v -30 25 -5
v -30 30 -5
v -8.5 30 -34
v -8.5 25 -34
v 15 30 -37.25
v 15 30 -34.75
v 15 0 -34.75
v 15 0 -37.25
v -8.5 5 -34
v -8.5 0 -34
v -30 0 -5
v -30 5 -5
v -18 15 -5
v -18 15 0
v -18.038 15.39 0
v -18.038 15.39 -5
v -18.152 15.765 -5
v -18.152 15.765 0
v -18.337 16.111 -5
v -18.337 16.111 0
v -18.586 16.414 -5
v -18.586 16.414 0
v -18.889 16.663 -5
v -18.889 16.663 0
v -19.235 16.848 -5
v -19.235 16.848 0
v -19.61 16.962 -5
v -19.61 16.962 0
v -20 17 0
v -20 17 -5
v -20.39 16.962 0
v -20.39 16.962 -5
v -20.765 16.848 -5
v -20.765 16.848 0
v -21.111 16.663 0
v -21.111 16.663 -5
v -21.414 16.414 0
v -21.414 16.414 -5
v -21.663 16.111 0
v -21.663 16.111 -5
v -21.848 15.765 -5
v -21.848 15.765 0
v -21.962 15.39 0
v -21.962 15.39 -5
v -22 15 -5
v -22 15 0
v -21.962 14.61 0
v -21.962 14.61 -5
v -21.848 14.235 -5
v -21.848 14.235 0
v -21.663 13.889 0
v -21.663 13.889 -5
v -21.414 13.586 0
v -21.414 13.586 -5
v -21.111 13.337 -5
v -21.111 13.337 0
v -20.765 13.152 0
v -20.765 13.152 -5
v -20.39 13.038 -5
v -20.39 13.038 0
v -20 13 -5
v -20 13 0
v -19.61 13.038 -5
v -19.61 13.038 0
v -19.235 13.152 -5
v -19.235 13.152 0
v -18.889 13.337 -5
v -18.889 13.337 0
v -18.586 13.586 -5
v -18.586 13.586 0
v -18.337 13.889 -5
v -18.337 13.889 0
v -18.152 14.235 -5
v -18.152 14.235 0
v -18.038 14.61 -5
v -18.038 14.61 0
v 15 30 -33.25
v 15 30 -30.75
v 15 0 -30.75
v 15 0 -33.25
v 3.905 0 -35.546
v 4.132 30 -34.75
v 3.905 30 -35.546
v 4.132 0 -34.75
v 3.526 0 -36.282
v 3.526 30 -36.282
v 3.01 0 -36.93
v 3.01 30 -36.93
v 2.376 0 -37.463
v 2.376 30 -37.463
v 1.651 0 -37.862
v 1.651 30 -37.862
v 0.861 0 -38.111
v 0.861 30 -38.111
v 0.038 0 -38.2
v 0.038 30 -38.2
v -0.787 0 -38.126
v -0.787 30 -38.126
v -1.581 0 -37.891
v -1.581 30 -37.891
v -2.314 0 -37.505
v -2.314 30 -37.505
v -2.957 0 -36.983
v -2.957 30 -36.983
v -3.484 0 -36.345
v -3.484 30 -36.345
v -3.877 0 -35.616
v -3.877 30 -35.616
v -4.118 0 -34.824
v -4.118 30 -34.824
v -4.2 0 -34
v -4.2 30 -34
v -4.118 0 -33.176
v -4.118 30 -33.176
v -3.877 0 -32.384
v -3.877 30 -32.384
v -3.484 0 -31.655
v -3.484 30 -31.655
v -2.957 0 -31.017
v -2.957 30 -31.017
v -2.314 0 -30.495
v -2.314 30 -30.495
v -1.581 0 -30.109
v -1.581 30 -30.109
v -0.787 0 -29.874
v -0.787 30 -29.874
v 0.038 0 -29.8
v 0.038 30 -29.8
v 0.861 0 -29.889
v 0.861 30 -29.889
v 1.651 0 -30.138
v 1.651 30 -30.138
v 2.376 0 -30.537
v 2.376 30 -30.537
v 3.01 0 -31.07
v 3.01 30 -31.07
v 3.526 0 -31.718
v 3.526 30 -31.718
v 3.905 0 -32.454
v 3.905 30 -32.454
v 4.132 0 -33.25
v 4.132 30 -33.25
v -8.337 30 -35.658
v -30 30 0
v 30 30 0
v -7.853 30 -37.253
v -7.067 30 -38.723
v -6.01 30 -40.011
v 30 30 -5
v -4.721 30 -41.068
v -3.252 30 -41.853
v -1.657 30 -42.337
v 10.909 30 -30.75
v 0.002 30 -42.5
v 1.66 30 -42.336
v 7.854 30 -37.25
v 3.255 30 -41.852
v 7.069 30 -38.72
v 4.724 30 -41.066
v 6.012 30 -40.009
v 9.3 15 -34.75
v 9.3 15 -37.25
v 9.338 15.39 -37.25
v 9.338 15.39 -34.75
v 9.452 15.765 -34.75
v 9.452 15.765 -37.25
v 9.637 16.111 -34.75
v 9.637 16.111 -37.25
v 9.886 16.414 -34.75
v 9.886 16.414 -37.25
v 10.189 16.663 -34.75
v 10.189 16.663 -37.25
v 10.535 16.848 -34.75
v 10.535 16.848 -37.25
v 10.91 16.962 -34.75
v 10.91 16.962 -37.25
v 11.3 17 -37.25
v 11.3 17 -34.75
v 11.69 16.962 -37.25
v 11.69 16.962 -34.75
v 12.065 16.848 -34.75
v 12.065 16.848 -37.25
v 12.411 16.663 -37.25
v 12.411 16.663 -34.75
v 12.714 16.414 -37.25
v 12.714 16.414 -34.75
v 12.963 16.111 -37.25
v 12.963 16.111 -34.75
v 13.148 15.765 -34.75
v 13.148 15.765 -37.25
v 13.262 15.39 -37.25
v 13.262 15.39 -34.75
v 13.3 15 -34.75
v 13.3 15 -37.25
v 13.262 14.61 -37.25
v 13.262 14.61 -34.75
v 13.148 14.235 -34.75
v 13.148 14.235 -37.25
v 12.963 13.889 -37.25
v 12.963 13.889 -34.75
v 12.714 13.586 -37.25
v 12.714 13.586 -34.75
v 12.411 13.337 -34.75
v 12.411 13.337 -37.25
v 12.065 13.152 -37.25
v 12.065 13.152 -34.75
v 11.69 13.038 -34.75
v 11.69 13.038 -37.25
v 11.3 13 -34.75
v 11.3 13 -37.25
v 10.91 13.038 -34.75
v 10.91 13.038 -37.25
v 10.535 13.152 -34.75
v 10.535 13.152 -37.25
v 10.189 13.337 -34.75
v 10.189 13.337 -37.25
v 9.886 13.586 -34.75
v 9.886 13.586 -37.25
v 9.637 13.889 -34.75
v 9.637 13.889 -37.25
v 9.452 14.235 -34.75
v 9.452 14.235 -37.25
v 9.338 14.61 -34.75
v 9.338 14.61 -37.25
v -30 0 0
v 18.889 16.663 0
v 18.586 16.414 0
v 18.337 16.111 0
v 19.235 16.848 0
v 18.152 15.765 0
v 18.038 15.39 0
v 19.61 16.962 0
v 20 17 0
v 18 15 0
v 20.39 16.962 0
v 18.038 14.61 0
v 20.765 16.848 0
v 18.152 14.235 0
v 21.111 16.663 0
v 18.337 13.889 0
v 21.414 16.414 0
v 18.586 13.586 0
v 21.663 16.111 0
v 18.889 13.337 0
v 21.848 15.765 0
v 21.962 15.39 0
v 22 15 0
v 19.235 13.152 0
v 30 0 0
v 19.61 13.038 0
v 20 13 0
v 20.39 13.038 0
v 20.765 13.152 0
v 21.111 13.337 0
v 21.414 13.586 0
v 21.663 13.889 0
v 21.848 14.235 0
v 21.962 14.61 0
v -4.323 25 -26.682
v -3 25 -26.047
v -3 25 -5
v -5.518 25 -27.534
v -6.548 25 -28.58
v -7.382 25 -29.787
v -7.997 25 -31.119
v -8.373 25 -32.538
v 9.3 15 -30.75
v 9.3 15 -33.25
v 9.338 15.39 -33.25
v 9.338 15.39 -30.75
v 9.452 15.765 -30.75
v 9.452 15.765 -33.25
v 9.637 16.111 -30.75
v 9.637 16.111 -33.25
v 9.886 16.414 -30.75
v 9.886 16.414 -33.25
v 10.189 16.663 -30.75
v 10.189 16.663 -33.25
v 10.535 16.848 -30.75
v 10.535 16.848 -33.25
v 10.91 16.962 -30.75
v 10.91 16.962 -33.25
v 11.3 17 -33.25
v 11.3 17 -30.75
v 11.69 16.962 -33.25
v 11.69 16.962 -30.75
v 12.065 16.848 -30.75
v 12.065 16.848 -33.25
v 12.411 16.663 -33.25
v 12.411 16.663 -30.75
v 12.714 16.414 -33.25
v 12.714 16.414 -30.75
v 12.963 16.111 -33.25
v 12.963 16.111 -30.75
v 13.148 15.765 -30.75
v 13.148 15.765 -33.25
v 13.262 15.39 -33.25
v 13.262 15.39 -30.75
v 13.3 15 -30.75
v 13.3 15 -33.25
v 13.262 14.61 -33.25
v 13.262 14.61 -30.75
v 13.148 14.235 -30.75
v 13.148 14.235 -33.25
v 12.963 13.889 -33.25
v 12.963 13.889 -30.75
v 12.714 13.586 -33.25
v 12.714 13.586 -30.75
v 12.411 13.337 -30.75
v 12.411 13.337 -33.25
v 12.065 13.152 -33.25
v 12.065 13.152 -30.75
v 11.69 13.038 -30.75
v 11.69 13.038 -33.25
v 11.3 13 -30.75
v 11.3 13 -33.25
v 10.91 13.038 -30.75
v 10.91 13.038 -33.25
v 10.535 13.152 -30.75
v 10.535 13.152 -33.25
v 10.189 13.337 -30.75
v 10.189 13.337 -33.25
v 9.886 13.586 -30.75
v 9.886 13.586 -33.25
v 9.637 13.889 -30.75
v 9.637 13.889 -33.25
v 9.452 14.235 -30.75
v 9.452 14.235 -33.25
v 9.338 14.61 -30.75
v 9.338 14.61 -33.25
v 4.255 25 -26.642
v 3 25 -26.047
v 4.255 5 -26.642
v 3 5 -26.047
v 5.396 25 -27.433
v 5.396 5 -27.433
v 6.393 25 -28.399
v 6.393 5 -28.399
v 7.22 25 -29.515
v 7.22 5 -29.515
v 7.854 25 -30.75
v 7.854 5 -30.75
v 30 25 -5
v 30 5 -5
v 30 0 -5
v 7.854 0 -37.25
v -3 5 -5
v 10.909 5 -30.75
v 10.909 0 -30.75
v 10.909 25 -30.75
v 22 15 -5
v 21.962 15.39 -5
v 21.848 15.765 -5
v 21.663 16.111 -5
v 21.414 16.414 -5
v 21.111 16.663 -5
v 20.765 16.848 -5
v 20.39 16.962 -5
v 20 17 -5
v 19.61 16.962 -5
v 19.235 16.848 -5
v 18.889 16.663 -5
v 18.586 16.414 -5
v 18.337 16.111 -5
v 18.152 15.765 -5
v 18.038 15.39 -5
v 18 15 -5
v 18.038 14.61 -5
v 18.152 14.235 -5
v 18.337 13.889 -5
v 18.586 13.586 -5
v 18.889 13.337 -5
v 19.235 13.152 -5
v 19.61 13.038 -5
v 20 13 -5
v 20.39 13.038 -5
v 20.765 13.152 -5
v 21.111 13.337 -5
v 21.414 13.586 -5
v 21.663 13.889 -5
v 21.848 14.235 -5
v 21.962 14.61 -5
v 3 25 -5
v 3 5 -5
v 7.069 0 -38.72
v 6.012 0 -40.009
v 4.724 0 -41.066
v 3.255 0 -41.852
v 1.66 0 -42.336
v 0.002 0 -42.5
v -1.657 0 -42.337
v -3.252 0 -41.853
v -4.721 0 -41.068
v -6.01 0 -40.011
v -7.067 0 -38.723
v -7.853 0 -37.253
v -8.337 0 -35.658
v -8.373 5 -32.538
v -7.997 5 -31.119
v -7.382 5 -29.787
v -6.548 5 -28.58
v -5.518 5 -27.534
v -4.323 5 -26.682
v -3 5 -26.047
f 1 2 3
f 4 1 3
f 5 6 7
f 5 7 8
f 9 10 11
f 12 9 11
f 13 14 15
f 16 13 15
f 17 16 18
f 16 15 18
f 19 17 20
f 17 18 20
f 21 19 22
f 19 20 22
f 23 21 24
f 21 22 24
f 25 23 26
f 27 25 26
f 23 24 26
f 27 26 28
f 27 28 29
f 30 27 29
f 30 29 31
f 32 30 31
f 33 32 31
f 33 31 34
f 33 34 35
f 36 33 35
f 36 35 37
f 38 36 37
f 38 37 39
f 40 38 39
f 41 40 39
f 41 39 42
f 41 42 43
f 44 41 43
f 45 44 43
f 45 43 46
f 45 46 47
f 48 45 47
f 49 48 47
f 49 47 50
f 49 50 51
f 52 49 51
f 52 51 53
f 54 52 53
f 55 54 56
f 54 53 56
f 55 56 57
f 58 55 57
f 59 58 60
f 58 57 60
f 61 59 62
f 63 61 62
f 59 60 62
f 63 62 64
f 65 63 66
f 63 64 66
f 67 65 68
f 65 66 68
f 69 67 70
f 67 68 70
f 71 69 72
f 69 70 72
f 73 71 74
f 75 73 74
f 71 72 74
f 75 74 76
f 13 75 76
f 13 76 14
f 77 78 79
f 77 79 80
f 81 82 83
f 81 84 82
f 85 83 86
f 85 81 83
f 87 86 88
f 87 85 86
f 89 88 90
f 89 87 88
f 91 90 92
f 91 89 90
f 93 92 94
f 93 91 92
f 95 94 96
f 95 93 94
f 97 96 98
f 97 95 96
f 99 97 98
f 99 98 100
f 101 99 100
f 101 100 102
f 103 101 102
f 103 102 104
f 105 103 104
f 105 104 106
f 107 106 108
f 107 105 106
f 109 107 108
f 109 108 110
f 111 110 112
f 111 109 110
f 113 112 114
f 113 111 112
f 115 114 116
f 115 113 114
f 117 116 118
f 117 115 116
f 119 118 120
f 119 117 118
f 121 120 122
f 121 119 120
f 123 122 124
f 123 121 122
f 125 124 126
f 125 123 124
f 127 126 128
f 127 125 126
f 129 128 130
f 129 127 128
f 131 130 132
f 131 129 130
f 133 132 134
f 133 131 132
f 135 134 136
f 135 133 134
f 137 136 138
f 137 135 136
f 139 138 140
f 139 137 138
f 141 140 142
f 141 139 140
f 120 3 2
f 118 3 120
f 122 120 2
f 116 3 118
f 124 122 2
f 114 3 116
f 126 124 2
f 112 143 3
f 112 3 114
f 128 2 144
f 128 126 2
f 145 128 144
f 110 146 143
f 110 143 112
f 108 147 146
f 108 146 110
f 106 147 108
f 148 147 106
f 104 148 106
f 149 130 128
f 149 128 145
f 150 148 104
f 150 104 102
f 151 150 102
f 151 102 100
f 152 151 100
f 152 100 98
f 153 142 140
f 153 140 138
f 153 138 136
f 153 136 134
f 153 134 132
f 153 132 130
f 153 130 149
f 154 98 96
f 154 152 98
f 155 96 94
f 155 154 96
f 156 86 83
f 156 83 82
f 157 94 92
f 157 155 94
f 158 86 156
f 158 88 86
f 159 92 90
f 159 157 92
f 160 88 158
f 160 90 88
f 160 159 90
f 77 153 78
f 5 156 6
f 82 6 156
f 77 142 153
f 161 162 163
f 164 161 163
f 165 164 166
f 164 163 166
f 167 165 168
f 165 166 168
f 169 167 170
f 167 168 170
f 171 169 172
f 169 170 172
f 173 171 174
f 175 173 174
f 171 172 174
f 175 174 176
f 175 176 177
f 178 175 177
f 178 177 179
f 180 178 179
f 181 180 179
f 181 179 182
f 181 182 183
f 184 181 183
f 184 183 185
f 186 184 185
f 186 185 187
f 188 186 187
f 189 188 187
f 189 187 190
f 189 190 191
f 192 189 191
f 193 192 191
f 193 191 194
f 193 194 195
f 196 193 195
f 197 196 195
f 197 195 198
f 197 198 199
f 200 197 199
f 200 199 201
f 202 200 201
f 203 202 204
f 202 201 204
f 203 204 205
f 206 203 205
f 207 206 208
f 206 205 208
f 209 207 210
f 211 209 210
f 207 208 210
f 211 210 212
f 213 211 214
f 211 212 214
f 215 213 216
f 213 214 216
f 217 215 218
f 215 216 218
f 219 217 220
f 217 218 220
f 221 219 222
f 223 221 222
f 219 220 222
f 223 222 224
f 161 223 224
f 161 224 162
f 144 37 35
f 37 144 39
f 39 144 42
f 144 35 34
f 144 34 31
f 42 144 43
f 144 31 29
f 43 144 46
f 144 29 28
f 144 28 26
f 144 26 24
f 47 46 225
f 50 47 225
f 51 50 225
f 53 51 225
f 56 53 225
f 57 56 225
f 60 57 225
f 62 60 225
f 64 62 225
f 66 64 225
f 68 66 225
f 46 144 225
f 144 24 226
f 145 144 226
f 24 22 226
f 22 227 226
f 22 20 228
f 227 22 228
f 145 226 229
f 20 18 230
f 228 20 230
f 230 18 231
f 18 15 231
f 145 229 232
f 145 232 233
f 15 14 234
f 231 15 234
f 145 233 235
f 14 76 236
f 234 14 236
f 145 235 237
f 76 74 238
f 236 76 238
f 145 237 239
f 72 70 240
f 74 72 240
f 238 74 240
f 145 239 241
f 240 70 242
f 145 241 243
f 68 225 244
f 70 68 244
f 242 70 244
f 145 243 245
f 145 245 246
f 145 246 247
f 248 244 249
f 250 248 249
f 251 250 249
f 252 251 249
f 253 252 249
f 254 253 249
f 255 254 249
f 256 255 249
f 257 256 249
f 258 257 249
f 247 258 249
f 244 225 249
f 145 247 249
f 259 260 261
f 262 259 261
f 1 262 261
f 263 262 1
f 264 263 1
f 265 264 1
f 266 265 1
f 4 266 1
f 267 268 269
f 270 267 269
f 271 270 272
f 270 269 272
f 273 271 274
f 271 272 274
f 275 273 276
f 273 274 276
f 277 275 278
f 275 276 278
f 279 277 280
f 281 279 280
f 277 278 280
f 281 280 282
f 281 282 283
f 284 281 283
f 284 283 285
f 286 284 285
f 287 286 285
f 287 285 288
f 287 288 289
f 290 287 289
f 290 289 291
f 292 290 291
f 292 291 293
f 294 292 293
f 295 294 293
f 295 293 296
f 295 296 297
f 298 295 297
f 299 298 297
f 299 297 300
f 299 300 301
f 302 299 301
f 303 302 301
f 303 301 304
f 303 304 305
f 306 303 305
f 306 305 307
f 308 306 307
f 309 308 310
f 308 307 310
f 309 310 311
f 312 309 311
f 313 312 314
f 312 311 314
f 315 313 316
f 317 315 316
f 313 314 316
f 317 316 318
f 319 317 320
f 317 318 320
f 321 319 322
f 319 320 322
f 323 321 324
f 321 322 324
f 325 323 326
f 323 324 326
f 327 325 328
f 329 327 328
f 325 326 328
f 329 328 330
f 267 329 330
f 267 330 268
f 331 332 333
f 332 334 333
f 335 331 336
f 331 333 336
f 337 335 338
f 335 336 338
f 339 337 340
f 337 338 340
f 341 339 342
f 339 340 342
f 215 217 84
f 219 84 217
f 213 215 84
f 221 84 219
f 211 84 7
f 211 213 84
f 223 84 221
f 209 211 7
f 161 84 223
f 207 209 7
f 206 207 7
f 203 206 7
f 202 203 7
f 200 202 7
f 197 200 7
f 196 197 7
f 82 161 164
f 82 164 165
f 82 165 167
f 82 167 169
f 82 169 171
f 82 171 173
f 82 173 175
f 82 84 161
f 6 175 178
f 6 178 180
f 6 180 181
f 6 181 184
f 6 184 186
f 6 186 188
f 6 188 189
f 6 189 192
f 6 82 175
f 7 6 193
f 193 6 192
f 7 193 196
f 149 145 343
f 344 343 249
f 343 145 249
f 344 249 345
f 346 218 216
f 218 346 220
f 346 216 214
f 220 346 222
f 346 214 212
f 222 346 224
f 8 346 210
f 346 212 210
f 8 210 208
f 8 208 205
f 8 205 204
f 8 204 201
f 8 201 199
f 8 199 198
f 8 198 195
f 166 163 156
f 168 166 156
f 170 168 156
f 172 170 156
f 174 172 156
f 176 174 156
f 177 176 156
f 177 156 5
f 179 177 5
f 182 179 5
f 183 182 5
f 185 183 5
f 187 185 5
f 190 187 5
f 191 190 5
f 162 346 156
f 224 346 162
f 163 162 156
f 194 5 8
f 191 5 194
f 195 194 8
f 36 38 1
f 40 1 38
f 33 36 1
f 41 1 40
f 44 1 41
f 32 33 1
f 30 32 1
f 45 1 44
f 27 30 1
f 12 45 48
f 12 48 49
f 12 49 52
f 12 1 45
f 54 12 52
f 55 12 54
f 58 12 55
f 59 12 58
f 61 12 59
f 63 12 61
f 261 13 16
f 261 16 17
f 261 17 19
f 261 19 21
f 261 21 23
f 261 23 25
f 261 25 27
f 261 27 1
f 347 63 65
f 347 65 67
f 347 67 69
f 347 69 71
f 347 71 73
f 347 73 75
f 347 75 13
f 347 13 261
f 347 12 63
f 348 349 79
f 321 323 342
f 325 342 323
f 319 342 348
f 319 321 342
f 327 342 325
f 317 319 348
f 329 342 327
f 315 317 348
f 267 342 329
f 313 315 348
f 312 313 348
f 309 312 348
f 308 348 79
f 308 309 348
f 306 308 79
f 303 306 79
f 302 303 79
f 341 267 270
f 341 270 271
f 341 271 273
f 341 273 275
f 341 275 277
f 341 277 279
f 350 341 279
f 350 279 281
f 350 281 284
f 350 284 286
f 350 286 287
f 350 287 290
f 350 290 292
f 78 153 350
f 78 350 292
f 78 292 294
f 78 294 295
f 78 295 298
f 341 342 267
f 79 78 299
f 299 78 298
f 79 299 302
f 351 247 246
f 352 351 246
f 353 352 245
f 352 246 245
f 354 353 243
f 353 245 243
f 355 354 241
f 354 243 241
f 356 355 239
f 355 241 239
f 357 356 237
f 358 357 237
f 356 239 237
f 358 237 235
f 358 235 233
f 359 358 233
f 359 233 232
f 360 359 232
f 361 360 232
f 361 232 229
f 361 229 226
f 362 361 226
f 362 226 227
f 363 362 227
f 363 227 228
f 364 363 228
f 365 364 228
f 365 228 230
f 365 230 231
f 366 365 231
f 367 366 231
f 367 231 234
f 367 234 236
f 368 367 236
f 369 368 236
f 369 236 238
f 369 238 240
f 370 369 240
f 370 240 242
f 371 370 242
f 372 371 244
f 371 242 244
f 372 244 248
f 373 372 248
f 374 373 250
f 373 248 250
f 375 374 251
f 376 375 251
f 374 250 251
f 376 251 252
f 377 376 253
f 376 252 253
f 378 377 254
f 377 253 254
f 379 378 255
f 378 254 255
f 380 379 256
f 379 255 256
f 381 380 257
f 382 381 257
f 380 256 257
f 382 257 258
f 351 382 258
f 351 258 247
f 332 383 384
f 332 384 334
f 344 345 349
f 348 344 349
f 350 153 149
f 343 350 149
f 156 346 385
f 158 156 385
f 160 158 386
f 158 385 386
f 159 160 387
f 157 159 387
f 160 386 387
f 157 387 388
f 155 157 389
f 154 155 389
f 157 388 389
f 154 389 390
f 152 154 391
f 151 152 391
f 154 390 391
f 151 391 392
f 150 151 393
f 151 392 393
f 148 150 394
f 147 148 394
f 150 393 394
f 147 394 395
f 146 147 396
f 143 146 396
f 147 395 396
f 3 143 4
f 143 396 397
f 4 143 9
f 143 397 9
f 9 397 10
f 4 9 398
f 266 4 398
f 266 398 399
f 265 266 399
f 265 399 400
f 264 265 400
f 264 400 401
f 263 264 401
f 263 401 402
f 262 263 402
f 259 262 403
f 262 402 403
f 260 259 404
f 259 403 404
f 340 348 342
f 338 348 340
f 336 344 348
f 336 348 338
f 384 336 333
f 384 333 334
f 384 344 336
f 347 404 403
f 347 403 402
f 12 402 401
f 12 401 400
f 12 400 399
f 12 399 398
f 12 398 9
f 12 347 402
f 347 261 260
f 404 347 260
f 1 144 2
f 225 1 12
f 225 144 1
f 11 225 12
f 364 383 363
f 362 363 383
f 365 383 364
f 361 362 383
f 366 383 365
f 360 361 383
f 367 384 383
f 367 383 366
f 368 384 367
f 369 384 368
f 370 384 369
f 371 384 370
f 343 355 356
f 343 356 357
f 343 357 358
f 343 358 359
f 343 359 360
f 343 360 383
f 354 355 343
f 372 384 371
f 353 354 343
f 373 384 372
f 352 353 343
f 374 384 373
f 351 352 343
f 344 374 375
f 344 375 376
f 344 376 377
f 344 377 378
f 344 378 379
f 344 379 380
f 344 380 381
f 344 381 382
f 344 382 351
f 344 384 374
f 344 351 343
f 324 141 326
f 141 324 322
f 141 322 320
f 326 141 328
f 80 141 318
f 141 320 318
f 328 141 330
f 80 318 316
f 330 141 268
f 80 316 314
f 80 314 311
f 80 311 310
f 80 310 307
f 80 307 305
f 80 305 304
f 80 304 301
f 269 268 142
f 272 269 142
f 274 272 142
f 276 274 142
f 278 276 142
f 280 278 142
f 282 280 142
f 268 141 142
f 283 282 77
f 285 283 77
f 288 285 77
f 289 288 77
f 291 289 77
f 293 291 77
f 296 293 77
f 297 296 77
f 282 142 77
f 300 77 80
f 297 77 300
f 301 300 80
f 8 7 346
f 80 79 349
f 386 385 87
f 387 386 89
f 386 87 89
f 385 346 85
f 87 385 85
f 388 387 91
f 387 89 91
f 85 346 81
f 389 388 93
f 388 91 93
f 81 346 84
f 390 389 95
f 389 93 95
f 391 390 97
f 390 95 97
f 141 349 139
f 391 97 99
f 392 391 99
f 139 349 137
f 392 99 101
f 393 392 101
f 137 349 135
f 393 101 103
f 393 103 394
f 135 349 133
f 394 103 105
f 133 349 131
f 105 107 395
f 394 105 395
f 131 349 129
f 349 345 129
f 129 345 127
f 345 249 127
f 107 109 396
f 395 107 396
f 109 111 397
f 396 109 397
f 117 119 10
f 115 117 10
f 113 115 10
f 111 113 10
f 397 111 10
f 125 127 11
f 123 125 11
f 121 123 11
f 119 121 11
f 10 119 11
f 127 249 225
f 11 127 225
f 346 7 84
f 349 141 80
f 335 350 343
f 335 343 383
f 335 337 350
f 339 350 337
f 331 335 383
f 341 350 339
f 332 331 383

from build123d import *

# Parameters (mm, degrees)
SZKIC1_R                      = 8.5
SZKIC1_R_2                    = 4.2
DODANIE_WYCI_GNI_CIE1_DEPTH   = 30
SZKIC1_W                      = 60
SZKIC1_H                      = 5
DODANIE_WYCI_GNI_CIE1_2_DEPTH = 30
DODANIE_WYCI_GNI_CIE2_DEPTH   = 5
SZKIC3_W                      = 6
SZKIC3_H                      = 22
DODANIE_WYCI_GNI_CIE3_DEPTH   = 26
DODANIE_WYCI_GNI_CIE4_DEPTH   = 5
WYTNIJ_WYCI_GNI_CIE1_REACH    = 62.052
SZKIC5_R                      = 2
WYTNIJ_WYCI_GNI_CIE2_REACH    = 62.052
SZKIC6_W                      = 10.270986067
SZKIC6_H                      = 1.5
SZKIC7_W                      = 9.24961725
SZKIC7_H                      = 2.5
DODANIE_WYCI_GNI_CIE5_DEPTH   = 30
SZKIC8_R                      = 2
WYTNIJ_WYCI_GNI_CIE3_DEPTH    = 30


with BuildPart() as part:
    # Szkic1 → Dodanie-wyciągnięcie1 (new body)
    with BuildSketch(Plane(origin=(0, 0, 0), x_dir=(1, 0, 0), z_dir=(0, 1, 0))):
        with Locations(Location((0, 34, 0), (0, 0, 270))):
            Circle(SZKIC1_R)
        with Locations(Location((0, 34, 0), (0, 0, 270))):
            Circle(SZKIC1_R_2, mode=Mode.SUBTRACT)
    extrude(amount=DODANIE_WYCI_GNI_CIE1_DEPTH)



with BuildPart() as body_2:
    # Szkic1 → Dodanie-wyci_gni_cie1 2 (new body)
    with BuildSketch(Plane(origin=(0, 0, 0), x_dir=(1, 0, 0), z_dir=(0, 1, 0))):
        with Locations((0, 2.5)):
            Rectangle(SZKIC1_W, SZKIC1_H)
    extrude(amount=DODANIE_WYCI_GNI_CIE1_2_DEPTH)


with BuildPart() as part_1:
    add(part.part)

    add(body_2.part)  # Dodanie-wyciągnięcie2 merges body 2
    # Szkic2 → Dodanie-wyciągnięcie2 (add)
    with BuildSketch(Plane.XZ):
        Polygon((30, -5), (8.5, -34), (0, -25.5), (-8.5, -34), (-30, -5), align=None)
    extrude(amount=-DODANIE_WYCI_GNI_CIE2_DEPTH)

    # Szkic3 → Dodanie-wyciągnięcie3 (add)
    with BuildSketch(Plane(origin=(0, 30, 0), x_dir=(1, 0, 0), z_dir=(0, 1, 0))):
        with Locations((0, 16)):
            Rectangle(SZKIC3_W, SZKIC3_H)
    extrude(amount=-DODANIE_WYCI_GNI_CIE3_DEPTH)

    # Szkic4 → Dodanie-wyciągnięcie4 (add)
    with BuildSketch(Plane(origin=(0, 30, 0), x_dir=(1, 0, 0), z_dir=(0, 1, 0))):
        Polygon((0, 26.824162036), (8.5, 34), (30, 5), (-30, 5), (-8.5, 34), align=None)
    extrude(amount=-DODANIE_WYCI_GNI_CIE4_DEPTH)

    # Szkic5 → Wytnij-wyciągnięcie1 (cut, up to next)
    with BuildSketch(Plane.XY, mode=Mode.PRIVATE) as wytnij_wyci_gni_cie1_sk1:
        with Locations((-20, 15)):
            Circle(SZKIC5_R)
    wytnij_wyci_gni_cie1_tool1 = extrude(wytnij_wyci_gni_cie1_sk1.sketch, amount=-WYTNIJ_WYCI_GNI_CIE1_REACH, mode=Mode.PRIVATE) & part_1.part
    # Szkic5 → Wytnij-wyciągnięcie1 (cut, up to next)
    with BuildSketch(Plane.XY, mode=Mode.PRIVATE) as wytnij_wyci_gni_cie1_sk2:
        with Locations((20, 15)):
            Circle(SZKIC5_R)
    wytnij_wyci_gni_cie1_tool2 = extrude(wytnij_wyci_gni_cie1_sk2.sketch, amount=-WYTNIJ_WYCI_GNI_CIE1_REACH, mode=Mode.PRIVATE) & part_1.part
    add(wytnij_wyci_gni_cie1_tool1.solids().sort_by_distance((-20, 15, 0))[0], mode=Mode.SUBTRACT)
    add(wytnij_wyci_gni_cie1_tool2.solids().sort_by_distance((20, 15, 0))[0], mode=Mode.SUBTRACT)

    # Szkic6 → Wytnij-wyciągnięcie2 (cut, up to next)
    with BuildSketch(Plane(origin=(0, 30, 0), x_dir=(1, 0, 0), z_dir=(0, 1, 0)), mode=Mode.PRIVATE) as wytnij_wyci_gni_cie2_sk1:
        with Locations((5.135493034, 34)):
            Rectangle(SZKIC6_W, SZKIC6_H)
    wytnij_wyci_gni_cie2_tool1 = extrude(wytnij_wyci_gni_cie2_sk1.sketch, amount=-WYTNIJ_WYCI_GNI_CIE2_REACH, mode=Mode.PRIVATE) & part_1.part
    add(wytnij_wyci_gni_cie2_tool1.solids().sort_by_distance((5.135493, 30, -34))[0], mode=Mode.SUBTRACT)

    # Szkic7 → Dodanie-wyciągnięcie5 (add)
    with BuildSketch(Plane(origin=(0, 30, 0), x_dir=(1, 0, 0), z_dir=(0, 1, 0))):
        with Locations((10.375191375, 32)):
            Rectangle(SZKIC7_W, SZKIC7_H)
        with Locations((10.375191375, 36)):
            Rectangle(SZKIC7_W, SZKIC7_H)
    extrude(amount=-DODANIE_WYCI_GNI_CIE5_DEPTH)

    # Szkic8 → Wytnij-wyciągnięcie3 (cut)
    with BuildSketch(Plane(origin=(0, 0, -37.25), x_dir=(-1, 0, 0), z_dir=(0, 0, -1))):
        with Locations((-11.3, 15)):
            Circle(SZKIC8_R)
    extrude(amount=-WYTNIJ_WYCI_GNI_CIE3_DEPTH, mode=Mode.SUBTRACT)


solid = part_1.part
